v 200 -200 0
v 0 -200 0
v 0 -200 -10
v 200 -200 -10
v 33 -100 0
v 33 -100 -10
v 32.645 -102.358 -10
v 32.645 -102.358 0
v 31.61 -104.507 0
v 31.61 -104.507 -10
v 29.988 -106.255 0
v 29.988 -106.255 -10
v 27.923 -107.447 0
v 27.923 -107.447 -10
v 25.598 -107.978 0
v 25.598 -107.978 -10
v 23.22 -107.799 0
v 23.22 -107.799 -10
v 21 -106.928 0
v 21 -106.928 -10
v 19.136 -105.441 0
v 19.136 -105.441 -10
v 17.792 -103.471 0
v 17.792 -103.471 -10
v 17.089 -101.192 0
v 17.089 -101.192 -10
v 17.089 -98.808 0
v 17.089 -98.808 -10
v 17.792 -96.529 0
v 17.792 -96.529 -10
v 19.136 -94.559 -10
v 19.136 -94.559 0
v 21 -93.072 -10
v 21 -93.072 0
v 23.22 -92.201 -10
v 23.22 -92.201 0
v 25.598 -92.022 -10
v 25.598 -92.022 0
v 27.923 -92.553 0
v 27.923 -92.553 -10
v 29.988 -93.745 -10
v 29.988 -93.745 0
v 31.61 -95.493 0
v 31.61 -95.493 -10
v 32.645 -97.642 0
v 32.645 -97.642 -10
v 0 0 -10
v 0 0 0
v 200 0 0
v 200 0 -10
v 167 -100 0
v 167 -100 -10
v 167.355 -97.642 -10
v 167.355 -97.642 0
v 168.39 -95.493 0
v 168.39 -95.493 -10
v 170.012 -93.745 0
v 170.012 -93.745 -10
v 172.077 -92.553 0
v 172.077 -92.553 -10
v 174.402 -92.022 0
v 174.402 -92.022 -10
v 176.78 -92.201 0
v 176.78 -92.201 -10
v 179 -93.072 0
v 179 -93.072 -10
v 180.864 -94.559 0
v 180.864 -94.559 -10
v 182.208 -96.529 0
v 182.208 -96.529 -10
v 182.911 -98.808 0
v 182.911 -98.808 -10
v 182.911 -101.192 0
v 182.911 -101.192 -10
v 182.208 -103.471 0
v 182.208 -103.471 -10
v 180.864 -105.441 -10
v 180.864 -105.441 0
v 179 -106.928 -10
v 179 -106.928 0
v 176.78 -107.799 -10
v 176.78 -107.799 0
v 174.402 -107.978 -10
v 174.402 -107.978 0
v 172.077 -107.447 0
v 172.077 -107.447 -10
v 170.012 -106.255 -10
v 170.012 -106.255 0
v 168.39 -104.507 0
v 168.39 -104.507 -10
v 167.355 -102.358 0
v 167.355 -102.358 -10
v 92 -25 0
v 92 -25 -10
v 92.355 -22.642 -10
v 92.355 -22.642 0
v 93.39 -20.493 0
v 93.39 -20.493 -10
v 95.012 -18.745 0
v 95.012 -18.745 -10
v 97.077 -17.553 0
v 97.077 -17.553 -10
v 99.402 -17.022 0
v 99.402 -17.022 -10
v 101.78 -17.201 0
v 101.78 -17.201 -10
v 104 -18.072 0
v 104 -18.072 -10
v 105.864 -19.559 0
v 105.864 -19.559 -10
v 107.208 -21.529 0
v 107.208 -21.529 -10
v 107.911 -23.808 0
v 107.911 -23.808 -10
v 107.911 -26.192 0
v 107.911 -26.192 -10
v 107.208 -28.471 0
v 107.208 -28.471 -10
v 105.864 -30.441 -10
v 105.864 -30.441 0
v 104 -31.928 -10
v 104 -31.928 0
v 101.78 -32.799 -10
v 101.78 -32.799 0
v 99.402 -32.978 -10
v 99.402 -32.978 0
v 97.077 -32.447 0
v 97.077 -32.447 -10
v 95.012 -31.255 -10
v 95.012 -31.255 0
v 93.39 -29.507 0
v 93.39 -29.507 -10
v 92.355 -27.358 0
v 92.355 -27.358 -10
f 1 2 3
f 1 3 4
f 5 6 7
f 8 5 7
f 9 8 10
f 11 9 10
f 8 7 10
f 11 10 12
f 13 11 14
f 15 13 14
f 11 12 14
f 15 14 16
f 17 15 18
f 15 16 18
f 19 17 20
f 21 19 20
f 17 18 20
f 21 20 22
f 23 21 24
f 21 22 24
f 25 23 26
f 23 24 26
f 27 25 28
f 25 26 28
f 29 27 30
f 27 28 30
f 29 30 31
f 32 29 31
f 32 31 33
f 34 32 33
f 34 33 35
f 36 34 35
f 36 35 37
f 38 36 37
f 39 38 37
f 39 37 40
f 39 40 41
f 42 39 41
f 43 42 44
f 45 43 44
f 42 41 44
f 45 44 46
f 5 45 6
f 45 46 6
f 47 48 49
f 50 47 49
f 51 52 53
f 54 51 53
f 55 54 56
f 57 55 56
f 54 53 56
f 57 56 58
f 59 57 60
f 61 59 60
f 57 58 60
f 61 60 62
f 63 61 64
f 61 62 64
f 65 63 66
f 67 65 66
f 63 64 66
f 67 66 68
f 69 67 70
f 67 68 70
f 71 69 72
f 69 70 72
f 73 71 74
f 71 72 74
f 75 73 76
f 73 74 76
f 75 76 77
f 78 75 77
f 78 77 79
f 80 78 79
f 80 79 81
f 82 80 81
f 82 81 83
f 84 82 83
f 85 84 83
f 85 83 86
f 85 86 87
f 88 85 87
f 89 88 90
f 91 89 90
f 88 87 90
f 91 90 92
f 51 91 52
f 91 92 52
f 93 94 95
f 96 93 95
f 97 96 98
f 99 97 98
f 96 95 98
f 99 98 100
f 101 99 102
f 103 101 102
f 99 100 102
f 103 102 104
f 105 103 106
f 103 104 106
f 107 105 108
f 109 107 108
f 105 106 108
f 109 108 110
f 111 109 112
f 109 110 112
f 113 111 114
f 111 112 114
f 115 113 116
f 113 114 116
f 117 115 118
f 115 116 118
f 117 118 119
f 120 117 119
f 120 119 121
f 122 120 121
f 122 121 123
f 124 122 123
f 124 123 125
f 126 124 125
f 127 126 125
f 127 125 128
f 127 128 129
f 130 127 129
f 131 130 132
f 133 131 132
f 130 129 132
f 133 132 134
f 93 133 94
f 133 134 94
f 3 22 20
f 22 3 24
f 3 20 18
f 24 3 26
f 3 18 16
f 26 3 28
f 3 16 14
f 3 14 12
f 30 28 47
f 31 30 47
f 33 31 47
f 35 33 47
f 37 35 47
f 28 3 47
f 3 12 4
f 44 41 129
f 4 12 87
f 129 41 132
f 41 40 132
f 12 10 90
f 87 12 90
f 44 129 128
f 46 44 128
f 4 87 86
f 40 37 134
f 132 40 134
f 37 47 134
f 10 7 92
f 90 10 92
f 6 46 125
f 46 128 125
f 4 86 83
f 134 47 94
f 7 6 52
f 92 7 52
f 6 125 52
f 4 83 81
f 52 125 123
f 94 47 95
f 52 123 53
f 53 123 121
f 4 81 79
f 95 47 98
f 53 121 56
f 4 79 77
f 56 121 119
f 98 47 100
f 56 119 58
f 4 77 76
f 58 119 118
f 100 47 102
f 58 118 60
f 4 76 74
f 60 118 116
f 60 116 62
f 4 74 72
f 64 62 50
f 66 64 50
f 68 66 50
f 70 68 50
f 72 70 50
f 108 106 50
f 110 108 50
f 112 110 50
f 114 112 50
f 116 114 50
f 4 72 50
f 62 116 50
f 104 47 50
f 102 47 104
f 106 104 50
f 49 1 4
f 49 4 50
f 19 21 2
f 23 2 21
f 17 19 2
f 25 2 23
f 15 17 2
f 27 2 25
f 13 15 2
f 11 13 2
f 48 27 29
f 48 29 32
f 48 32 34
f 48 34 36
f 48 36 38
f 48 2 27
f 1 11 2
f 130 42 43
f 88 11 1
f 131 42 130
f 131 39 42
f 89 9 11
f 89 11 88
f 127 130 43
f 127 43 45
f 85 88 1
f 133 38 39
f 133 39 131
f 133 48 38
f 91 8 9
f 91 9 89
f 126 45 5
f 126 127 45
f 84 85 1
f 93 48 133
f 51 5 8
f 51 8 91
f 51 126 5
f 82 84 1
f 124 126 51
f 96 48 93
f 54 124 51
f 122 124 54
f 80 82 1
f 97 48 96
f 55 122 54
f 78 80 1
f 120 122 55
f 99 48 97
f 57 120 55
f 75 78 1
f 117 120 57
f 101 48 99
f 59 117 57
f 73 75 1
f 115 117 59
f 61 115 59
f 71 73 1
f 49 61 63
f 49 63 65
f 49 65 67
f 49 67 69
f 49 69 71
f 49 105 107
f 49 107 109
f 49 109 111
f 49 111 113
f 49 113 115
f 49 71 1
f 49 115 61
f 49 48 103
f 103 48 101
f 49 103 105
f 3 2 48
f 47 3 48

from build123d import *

# Parameters (mm, degrees)
SKETCH_1_W             = 200
SKETCH_1_H             = 200
SM_BASE_FLANGE_1_DEPTH = 10
SKETCH_3_R             = 8
CUT_EXTRUDE_1_DEPTH    = 10


# Sheet-metal steps are written as plain solids
with BuildPart() as part:
    # Sketch 1 → Базовая кромка1 (new body)
    with BuildSketch(Plane.XY):
        with Locations((100, -100)):
            Rectangle(SKETCH_1_W, SKETCH_1_H)
    extrude(amount=-SM_BASE_FLANGE_1_DEPTH)

    # Эскиз3 → Вырез-Вытянуть1 (cut)
    with BuildSketch(Plane(origin=(0, 0, -10), x_dir=(-1, 0, 0), z_dir=(0, 0, -1))):
        with Locations((-175, -100)):
            Circle(SKETCH_3_R)
        with Locations((-100, -25)):
            Circle(SKETCH_3_R)
        with Locations(Location((-25, -100, 0), (0, 0, 180))):
            Circle(SKETCH_3_R)
    extrude(amount=-CUT_EXTRUDE_1_DEPTH, mode=Mode.SUBTRACT)


solid = part.part
